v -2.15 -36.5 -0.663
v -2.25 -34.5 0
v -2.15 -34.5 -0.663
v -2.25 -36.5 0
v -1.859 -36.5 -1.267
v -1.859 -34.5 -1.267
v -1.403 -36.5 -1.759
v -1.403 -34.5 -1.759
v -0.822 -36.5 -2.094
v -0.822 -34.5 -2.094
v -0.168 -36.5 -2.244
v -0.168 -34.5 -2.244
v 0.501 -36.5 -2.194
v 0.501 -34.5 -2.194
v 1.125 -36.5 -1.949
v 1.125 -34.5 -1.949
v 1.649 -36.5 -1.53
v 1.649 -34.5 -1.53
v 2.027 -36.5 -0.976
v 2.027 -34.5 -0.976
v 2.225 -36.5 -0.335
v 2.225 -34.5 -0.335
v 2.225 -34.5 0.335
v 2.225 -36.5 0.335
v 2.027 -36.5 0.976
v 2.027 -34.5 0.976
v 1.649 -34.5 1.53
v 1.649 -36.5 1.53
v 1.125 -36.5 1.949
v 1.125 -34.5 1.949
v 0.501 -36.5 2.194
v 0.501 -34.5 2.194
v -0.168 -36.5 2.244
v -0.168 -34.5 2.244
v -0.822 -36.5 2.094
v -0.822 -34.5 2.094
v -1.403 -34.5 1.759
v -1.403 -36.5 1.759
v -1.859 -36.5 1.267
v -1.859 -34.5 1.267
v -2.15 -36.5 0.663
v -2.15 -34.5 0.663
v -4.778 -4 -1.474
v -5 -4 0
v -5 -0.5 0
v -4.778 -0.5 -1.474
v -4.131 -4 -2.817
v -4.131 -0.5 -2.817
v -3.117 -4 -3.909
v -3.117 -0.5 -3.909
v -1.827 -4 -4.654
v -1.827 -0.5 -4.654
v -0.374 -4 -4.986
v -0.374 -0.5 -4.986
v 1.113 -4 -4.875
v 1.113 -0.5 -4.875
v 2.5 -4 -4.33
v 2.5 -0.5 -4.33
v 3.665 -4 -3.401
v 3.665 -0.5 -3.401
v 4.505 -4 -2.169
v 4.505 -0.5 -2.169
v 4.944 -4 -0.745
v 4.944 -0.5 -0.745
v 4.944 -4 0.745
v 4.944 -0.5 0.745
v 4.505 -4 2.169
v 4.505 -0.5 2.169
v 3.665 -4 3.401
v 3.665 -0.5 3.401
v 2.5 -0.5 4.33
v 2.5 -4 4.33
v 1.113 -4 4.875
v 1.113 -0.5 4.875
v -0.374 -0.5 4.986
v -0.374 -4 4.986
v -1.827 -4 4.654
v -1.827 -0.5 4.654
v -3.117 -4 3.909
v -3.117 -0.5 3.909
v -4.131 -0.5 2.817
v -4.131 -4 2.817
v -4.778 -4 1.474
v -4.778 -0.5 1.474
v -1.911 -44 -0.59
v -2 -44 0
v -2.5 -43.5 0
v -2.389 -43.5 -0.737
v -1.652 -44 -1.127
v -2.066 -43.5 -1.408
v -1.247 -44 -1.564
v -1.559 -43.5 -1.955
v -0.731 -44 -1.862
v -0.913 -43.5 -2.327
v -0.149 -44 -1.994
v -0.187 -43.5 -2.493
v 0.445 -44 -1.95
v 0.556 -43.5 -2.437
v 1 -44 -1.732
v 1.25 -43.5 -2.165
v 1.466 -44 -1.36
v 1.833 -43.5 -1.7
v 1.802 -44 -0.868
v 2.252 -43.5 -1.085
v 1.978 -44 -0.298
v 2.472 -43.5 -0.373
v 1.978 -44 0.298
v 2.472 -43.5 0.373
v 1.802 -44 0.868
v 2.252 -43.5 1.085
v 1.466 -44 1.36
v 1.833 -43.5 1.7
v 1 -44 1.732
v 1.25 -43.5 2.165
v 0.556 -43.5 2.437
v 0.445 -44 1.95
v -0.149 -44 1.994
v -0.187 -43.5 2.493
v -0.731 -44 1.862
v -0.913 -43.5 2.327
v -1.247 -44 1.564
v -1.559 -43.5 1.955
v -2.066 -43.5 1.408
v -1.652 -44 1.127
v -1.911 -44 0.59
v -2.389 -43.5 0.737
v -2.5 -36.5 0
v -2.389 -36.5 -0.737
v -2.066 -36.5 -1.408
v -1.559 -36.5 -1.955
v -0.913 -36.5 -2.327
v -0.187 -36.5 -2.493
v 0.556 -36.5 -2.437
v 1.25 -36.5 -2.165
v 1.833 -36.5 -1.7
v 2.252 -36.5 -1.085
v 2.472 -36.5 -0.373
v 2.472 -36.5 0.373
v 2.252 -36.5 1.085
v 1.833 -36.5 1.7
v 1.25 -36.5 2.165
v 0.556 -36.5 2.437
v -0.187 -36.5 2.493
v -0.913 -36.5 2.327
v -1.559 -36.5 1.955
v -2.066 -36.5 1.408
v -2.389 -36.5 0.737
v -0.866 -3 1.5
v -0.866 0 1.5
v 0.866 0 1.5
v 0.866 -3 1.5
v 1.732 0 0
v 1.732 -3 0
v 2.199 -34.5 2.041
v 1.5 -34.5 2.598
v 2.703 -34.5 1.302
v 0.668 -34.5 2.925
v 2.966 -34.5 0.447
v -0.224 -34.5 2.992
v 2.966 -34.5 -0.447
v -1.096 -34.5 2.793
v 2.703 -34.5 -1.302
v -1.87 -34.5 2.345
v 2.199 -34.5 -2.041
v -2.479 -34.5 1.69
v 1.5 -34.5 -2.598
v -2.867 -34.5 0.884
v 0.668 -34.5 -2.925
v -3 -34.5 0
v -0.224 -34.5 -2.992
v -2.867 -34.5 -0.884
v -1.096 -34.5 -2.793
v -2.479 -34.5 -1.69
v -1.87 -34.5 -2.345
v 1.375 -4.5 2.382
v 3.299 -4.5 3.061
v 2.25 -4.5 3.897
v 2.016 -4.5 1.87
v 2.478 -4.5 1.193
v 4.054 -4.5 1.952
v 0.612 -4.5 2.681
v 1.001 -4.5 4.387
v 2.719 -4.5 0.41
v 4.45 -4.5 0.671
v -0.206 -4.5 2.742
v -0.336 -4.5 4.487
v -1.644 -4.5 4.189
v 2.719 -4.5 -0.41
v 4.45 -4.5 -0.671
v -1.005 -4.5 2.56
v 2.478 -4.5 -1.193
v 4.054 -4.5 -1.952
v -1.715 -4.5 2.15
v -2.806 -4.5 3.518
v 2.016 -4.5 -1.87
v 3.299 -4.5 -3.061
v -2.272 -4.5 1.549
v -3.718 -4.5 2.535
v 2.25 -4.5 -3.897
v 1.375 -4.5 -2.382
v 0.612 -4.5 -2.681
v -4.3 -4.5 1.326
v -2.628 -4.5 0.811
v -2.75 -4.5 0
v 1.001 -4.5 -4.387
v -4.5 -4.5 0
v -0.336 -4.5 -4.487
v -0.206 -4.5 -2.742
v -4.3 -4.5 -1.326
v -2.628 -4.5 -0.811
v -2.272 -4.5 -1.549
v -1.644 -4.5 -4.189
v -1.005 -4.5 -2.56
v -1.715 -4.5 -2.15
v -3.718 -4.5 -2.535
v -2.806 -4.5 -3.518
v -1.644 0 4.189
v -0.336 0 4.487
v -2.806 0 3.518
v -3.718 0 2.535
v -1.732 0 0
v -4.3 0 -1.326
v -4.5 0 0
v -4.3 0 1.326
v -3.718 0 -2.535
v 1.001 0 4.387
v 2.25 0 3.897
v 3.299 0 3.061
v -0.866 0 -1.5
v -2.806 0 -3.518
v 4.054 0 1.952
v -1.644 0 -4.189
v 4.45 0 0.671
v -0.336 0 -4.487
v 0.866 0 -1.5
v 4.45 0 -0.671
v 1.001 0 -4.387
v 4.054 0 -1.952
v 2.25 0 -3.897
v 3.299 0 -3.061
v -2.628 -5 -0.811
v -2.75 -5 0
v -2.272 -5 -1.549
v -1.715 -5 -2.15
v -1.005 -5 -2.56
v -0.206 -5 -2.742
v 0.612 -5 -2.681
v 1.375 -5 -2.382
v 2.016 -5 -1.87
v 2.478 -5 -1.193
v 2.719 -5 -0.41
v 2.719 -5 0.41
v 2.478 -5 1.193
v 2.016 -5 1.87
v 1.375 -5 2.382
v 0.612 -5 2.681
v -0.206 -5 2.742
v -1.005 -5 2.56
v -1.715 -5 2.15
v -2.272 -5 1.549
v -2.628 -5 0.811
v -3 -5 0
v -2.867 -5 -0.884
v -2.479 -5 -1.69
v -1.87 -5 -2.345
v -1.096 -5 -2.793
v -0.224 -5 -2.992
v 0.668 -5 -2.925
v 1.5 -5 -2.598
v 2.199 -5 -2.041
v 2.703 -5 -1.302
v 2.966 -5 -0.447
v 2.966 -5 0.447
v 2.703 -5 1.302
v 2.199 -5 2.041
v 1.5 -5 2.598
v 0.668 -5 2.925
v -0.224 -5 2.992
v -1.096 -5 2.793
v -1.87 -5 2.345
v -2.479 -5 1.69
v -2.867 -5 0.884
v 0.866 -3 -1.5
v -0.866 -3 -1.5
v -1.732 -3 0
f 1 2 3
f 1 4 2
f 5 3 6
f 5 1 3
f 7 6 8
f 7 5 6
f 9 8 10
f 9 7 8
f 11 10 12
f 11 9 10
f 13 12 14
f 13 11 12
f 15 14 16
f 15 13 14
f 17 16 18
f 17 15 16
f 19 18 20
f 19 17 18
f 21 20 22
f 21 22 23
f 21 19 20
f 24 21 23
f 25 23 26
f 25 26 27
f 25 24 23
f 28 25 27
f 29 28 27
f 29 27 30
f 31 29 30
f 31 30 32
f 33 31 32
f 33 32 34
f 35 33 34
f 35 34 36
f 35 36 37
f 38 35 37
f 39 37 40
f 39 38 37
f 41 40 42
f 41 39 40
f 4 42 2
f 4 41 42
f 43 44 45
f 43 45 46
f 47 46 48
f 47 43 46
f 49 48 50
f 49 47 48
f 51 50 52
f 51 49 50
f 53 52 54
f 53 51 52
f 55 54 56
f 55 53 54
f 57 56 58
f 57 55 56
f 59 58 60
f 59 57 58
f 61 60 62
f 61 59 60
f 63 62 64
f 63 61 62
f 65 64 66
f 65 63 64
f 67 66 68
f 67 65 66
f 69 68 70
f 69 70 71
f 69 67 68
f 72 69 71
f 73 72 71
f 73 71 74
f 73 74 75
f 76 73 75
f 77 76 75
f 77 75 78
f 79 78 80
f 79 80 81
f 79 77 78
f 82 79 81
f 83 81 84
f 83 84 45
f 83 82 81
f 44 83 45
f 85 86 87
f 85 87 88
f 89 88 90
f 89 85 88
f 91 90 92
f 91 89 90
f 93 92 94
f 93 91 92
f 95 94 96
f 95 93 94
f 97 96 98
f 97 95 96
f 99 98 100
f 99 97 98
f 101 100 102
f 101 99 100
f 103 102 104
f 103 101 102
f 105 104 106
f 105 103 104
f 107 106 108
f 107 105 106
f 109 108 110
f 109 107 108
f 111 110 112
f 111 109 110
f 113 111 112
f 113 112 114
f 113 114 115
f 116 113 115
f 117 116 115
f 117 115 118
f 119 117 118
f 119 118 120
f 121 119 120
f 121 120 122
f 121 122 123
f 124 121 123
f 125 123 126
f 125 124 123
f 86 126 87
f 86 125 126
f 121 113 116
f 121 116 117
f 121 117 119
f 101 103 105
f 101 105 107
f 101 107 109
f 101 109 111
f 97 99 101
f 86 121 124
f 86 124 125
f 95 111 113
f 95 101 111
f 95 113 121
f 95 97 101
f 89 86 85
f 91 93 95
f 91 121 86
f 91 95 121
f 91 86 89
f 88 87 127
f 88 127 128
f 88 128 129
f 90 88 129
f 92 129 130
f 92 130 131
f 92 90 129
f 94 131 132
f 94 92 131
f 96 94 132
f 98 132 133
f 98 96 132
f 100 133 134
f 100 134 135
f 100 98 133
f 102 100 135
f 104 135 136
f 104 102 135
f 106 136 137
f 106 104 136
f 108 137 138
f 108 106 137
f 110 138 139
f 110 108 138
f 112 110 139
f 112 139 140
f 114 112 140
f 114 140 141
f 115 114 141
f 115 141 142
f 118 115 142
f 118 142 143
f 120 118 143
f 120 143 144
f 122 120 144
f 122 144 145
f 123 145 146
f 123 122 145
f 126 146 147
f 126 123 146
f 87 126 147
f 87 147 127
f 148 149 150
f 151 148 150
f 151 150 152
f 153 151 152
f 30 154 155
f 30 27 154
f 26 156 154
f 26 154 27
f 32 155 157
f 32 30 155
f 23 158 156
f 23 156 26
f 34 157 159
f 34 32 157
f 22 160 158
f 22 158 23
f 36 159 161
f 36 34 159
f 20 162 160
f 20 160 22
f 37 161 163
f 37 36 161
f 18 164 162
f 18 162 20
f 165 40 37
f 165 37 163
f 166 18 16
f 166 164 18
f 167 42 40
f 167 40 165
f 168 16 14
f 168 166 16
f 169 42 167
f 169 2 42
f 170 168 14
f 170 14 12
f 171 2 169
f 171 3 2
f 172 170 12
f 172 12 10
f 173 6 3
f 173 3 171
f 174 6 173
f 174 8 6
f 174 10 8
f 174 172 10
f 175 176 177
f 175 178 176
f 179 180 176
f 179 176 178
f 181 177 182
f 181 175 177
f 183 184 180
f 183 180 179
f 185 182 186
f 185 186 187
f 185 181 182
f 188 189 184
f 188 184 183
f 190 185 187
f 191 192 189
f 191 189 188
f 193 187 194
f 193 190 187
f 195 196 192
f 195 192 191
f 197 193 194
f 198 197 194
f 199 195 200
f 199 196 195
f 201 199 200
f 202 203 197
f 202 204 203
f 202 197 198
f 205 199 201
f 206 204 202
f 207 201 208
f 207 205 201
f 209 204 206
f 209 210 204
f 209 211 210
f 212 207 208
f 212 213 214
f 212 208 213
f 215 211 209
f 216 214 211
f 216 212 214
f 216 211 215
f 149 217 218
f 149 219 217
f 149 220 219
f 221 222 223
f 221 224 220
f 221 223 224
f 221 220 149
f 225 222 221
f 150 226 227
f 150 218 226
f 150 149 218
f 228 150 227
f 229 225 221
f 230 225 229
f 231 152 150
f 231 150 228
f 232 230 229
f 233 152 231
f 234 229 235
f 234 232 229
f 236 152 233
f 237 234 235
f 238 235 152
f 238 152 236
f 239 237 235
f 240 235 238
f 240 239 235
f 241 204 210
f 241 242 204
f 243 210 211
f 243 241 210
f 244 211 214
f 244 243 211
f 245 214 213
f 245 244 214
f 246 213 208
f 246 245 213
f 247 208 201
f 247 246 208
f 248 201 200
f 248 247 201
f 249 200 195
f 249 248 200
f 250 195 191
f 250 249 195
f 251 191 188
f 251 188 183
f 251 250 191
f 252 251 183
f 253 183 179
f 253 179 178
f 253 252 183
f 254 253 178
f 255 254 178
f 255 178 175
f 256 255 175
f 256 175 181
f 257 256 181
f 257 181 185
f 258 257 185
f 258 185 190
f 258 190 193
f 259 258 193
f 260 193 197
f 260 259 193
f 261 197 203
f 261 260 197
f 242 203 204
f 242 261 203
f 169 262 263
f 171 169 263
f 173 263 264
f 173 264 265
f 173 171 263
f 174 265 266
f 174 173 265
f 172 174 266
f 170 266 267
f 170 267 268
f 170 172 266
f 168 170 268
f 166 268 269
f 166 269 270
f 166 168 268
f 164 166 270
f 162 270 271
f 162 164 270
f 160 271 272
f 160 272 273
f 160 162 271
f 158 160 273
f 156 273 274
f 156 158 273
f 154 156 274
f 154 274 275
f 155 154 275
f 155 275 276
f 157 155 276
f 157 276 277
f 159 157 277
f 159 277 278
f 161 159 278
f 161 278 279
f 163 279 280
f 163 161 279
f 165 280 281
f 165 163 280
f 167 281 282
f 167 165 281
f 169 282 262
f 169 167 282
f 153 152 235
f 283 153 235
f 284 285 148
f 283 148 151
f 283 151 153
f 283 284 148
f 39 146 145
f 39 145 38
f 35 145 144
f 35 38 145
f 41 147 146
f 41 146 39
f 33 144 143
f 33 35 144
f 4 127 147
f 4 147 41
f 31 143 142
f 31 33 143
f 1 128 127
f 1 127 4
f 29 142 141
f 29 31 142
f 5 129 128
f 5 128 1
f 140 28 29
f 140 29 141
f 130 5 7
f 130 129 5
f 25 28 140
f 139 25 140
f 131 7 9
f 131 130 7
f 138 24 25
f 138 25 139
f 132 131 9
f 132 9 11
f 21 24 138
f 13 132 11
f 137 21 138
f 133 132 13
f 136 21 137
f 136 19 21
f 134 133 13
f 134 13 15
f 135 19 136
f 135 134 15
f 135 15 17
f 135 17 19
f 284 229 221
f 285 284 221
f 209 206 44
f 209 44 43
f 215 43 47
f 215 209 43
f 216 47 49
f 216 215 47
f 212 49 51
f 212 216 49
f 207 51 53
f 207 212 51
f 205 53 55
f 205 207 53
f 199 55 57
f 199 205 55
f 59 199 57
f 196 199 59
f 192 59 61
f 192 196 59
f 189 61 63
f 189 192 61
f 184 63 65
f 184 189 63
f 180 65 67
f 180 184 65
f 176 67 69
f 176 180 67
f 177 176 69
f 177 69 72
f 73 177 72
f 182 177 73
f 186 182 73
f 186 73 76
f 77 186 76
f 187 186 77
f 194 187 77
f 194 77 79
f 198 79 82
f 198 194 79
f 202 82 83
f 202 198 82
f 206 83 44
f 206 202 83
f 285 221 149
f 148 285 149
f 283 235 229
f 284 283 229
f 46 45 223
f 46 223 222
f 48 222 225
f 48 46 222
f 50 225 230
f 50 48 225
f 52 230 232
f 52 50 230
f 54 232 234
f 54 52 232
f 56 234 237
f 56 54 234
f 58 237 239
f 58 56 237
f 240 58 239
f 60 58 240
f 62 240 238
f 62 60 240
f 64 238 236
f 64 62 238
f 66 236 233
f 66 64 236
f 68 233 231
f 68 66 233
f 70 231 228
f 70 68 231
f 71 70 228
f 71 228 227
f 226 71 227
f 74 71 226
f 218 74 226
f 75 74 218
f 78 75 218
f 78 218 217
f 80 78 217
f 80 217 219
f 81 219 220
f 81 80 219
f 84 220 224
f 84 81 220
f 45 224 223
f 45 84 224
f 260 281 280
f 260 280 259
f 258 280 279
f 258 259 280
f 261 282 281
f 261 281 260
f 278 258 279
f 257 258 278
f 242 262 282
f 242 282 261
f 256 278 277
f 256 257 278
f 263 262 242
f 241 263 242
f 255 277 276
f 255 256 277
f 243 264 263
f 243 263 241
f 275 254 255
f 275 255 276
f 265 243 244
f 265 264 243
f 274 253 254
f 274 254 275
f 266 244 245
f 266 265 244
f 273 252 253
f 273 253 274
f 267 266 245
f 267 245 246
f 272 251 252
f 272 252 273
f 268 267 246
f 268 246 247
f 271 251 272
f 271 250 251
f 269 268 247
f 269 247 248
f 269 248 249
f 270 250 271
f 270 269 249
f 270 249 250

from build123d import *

# Parameters (mm, degrees)
CHAMFER1_SIZE      = 0.5
CUT_EXTRUDE1_DEPTH = 3


with BuildPart() as part:
    # Sketch1 → Revolve1 (revolve)
    with BuildSketch(Plane.XY):
        Polygon((0, 0), (5, 0), (5, -4.5), (2.75, -4.5), (2.75, -5), (3, -5), (3, -34.5), (2.25, -34.5), (2.25, -36.5), (2.5, -36.5), (2.5, -44), (0, -44), align=None)
    revolve(axis=Axis((0, 3, 0), (0, -1, 0)))

    # Chamfer1
    chamfer1_edges = [part.edges().sort_by_distance(p)[0] for p in [
        (-2.5, -44, 0),
        (-5, -4.5, 0),
        (-5, 0, 0),
    ]]
    chamfer(chamfer1_edges, length=CHAMFER1_SIZE)

    # Sketch2 → Cut-Extrude1 (cut)
    with BuildSketch(Plane(origin=(0, 0, 0), x_dir=(1, 0, 0), z_dir=(0, 1, 0))):
        Polygon((1.732050808, 0), (0.866025404, 1.5), (-0.866025404, 1.5), (-1.732050808, 0), (-0.866025404, -1.5), (0.866025404, -1.5), align=None)
    extrude(amount=-CUT_EXTRUDE1_DEPTH, mode=Mode.SUBTRACT)


solid = part.part
